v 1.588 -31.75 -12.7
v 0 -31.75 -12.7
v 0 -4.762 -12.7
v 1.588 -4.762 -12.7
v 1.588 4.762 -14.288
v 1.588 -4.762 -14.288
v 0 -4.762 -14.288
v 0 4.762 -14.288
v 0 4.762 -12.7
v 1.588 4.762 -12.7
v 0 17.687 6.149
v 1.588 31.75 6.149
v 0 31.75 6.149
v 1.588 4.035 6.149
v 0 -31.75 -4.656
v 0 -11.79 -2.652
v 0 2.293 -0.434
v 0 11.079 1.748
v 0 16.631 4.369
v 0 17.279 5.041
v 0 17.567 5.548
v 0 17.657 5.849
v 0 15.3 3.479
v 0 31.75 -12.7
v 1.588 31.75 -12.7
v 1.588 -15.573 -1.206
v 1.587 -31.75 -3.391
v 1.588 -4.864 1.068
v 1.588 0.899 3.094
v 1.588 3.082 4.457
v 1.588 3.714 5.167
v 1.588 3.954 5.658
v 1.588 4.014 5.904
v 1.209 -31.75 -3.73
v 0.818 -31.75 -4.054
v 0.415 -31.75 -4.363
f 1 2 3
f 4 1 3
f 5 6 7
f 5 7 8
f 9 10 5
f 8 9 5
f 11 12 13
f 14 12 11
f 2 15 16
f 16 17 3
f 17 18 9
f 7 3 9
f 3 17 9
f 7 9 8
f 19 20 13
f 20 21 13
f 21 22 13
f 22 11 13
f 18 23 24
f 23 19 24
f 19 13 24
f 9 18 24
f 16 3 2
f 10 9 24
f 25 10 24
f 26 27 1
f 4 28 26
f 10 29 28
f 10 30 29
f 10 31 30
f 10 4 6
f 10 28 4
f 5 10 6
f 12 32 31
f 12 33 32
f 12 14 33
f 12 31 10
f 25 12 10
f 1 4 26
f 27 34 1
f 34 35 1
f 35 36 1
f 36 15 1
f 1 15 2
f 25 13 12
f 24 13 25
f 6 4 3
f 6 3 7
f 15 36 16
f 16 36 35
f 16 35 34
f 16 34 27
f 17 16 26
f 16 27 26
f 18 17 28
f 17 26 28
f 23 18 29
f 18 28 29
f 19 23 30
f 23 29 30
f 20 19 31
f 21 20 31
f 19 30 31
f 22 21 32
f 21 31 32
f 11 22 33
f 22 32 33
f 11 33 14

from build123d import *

# Parameters (mm, degrees)
SKETCH2_W           = 25.4
SKETCH2_H           = 63.5
BOSS_EXTRUDE1_DEPTH = 1.5875
SKETCH3_W           = 1.5875
SKETCH3_H           = 9.525
BOSS_EXTRUDE2_DEPTH = 1.5875
SKETCH3_4_W         = 1.5875
SKETCH3_4_H         = 9.525
CUT_EXTRUDE1_DEPTH  = 3.175
CUT_EXTRUDE2_DEPTH  = 35.85276621
CAVITY1_OUTLINE_W   = 13.081
CAVITY1_OUTLINE_H   = 49.289563405


# Read off the part's stored shape, not the designer's step: Cavity1
with BuildPart() as part:
    # Sketch2 → Boss-Extrude1 (new body)
    with BuildSketch(Plane(origin=(0, 0, 0), x_dir=(0, 0, -1), z_dir=(1, 0, 0))):
        Rectangle(SKETCH2_W, SKETCH2_H)
    extrude(amount=BOSS_EXTRUDE1_DEPTH)

    # Sketch3 → Boss-Extrude2 (add)
    with BuildSketch(Plane(origin=(1.5875, 0, 0), x_dir=(0, 0, -1), z_dir=(1, 0, 0))):
        with Locations((13.49375, 0)):
            Rectangle(SKETCH3_W, SKETCH3_H)
    extrude(amount=-BOSS_EXTRUDE2_DEPTH)

    # Sketch3<4> → Cut-Extrude1 (cut)
    with BuildSketch(Plane(origin=(1.5875, 0, 0), x_dir=(0, 0, -1), z_dir=(1, 0, 0))):
        with Locations((-11.90625, 0)):
            Rectangle(SKETCH3_4_W, SKETCH3_4_H)
    extrude(amount=-CUT_EXTRUDE1_DEPTH, mode=Mode.SUBTRACT)

    # Sketch4 → Cut-Extrude2 (cut, through all)
    with BuildSketch(Plane(origin=(1.5875, 0, 0), x_dir=(0, 0, -1), z_dir=(1, 0, 0))):
        Polygon((-6.14934, 31.75), (-6.14934, -31.75), (-12.7, -31.75), (-12.7, -4.7625), (-11.1125, -4.7625), (-11.1125, 4.7625), (-12.7, 4.7625), (-12.7, 31.75), align=None)
    extrude(amount=-CUT_EXTRUDE2_DEPTH, mode=Mode.SUBTRACT)

    # Cavity1 outline → Cavity1 (revolve, cut)
    with BuildSketch(Plane(origin=(-10.964254269, -1.274913287, 6.150528853), x_dir=(0.9933073803012532, 0.11550085817456804, 0), z_dir=(0, 0, -1))):
        with Locations((6.5405, 7.076085234)):
            Rectangle(CAVITY1_OUTLINE_W, CAVITY1_OUTLINE_H)
    revolve(axis=Axis((-10.964254269, -1.274913287, 6.150528853), (0.11550085817456807, -0.9933073803012534, 0)), mode=Mode.SUBTRACT)


solid = part.part
